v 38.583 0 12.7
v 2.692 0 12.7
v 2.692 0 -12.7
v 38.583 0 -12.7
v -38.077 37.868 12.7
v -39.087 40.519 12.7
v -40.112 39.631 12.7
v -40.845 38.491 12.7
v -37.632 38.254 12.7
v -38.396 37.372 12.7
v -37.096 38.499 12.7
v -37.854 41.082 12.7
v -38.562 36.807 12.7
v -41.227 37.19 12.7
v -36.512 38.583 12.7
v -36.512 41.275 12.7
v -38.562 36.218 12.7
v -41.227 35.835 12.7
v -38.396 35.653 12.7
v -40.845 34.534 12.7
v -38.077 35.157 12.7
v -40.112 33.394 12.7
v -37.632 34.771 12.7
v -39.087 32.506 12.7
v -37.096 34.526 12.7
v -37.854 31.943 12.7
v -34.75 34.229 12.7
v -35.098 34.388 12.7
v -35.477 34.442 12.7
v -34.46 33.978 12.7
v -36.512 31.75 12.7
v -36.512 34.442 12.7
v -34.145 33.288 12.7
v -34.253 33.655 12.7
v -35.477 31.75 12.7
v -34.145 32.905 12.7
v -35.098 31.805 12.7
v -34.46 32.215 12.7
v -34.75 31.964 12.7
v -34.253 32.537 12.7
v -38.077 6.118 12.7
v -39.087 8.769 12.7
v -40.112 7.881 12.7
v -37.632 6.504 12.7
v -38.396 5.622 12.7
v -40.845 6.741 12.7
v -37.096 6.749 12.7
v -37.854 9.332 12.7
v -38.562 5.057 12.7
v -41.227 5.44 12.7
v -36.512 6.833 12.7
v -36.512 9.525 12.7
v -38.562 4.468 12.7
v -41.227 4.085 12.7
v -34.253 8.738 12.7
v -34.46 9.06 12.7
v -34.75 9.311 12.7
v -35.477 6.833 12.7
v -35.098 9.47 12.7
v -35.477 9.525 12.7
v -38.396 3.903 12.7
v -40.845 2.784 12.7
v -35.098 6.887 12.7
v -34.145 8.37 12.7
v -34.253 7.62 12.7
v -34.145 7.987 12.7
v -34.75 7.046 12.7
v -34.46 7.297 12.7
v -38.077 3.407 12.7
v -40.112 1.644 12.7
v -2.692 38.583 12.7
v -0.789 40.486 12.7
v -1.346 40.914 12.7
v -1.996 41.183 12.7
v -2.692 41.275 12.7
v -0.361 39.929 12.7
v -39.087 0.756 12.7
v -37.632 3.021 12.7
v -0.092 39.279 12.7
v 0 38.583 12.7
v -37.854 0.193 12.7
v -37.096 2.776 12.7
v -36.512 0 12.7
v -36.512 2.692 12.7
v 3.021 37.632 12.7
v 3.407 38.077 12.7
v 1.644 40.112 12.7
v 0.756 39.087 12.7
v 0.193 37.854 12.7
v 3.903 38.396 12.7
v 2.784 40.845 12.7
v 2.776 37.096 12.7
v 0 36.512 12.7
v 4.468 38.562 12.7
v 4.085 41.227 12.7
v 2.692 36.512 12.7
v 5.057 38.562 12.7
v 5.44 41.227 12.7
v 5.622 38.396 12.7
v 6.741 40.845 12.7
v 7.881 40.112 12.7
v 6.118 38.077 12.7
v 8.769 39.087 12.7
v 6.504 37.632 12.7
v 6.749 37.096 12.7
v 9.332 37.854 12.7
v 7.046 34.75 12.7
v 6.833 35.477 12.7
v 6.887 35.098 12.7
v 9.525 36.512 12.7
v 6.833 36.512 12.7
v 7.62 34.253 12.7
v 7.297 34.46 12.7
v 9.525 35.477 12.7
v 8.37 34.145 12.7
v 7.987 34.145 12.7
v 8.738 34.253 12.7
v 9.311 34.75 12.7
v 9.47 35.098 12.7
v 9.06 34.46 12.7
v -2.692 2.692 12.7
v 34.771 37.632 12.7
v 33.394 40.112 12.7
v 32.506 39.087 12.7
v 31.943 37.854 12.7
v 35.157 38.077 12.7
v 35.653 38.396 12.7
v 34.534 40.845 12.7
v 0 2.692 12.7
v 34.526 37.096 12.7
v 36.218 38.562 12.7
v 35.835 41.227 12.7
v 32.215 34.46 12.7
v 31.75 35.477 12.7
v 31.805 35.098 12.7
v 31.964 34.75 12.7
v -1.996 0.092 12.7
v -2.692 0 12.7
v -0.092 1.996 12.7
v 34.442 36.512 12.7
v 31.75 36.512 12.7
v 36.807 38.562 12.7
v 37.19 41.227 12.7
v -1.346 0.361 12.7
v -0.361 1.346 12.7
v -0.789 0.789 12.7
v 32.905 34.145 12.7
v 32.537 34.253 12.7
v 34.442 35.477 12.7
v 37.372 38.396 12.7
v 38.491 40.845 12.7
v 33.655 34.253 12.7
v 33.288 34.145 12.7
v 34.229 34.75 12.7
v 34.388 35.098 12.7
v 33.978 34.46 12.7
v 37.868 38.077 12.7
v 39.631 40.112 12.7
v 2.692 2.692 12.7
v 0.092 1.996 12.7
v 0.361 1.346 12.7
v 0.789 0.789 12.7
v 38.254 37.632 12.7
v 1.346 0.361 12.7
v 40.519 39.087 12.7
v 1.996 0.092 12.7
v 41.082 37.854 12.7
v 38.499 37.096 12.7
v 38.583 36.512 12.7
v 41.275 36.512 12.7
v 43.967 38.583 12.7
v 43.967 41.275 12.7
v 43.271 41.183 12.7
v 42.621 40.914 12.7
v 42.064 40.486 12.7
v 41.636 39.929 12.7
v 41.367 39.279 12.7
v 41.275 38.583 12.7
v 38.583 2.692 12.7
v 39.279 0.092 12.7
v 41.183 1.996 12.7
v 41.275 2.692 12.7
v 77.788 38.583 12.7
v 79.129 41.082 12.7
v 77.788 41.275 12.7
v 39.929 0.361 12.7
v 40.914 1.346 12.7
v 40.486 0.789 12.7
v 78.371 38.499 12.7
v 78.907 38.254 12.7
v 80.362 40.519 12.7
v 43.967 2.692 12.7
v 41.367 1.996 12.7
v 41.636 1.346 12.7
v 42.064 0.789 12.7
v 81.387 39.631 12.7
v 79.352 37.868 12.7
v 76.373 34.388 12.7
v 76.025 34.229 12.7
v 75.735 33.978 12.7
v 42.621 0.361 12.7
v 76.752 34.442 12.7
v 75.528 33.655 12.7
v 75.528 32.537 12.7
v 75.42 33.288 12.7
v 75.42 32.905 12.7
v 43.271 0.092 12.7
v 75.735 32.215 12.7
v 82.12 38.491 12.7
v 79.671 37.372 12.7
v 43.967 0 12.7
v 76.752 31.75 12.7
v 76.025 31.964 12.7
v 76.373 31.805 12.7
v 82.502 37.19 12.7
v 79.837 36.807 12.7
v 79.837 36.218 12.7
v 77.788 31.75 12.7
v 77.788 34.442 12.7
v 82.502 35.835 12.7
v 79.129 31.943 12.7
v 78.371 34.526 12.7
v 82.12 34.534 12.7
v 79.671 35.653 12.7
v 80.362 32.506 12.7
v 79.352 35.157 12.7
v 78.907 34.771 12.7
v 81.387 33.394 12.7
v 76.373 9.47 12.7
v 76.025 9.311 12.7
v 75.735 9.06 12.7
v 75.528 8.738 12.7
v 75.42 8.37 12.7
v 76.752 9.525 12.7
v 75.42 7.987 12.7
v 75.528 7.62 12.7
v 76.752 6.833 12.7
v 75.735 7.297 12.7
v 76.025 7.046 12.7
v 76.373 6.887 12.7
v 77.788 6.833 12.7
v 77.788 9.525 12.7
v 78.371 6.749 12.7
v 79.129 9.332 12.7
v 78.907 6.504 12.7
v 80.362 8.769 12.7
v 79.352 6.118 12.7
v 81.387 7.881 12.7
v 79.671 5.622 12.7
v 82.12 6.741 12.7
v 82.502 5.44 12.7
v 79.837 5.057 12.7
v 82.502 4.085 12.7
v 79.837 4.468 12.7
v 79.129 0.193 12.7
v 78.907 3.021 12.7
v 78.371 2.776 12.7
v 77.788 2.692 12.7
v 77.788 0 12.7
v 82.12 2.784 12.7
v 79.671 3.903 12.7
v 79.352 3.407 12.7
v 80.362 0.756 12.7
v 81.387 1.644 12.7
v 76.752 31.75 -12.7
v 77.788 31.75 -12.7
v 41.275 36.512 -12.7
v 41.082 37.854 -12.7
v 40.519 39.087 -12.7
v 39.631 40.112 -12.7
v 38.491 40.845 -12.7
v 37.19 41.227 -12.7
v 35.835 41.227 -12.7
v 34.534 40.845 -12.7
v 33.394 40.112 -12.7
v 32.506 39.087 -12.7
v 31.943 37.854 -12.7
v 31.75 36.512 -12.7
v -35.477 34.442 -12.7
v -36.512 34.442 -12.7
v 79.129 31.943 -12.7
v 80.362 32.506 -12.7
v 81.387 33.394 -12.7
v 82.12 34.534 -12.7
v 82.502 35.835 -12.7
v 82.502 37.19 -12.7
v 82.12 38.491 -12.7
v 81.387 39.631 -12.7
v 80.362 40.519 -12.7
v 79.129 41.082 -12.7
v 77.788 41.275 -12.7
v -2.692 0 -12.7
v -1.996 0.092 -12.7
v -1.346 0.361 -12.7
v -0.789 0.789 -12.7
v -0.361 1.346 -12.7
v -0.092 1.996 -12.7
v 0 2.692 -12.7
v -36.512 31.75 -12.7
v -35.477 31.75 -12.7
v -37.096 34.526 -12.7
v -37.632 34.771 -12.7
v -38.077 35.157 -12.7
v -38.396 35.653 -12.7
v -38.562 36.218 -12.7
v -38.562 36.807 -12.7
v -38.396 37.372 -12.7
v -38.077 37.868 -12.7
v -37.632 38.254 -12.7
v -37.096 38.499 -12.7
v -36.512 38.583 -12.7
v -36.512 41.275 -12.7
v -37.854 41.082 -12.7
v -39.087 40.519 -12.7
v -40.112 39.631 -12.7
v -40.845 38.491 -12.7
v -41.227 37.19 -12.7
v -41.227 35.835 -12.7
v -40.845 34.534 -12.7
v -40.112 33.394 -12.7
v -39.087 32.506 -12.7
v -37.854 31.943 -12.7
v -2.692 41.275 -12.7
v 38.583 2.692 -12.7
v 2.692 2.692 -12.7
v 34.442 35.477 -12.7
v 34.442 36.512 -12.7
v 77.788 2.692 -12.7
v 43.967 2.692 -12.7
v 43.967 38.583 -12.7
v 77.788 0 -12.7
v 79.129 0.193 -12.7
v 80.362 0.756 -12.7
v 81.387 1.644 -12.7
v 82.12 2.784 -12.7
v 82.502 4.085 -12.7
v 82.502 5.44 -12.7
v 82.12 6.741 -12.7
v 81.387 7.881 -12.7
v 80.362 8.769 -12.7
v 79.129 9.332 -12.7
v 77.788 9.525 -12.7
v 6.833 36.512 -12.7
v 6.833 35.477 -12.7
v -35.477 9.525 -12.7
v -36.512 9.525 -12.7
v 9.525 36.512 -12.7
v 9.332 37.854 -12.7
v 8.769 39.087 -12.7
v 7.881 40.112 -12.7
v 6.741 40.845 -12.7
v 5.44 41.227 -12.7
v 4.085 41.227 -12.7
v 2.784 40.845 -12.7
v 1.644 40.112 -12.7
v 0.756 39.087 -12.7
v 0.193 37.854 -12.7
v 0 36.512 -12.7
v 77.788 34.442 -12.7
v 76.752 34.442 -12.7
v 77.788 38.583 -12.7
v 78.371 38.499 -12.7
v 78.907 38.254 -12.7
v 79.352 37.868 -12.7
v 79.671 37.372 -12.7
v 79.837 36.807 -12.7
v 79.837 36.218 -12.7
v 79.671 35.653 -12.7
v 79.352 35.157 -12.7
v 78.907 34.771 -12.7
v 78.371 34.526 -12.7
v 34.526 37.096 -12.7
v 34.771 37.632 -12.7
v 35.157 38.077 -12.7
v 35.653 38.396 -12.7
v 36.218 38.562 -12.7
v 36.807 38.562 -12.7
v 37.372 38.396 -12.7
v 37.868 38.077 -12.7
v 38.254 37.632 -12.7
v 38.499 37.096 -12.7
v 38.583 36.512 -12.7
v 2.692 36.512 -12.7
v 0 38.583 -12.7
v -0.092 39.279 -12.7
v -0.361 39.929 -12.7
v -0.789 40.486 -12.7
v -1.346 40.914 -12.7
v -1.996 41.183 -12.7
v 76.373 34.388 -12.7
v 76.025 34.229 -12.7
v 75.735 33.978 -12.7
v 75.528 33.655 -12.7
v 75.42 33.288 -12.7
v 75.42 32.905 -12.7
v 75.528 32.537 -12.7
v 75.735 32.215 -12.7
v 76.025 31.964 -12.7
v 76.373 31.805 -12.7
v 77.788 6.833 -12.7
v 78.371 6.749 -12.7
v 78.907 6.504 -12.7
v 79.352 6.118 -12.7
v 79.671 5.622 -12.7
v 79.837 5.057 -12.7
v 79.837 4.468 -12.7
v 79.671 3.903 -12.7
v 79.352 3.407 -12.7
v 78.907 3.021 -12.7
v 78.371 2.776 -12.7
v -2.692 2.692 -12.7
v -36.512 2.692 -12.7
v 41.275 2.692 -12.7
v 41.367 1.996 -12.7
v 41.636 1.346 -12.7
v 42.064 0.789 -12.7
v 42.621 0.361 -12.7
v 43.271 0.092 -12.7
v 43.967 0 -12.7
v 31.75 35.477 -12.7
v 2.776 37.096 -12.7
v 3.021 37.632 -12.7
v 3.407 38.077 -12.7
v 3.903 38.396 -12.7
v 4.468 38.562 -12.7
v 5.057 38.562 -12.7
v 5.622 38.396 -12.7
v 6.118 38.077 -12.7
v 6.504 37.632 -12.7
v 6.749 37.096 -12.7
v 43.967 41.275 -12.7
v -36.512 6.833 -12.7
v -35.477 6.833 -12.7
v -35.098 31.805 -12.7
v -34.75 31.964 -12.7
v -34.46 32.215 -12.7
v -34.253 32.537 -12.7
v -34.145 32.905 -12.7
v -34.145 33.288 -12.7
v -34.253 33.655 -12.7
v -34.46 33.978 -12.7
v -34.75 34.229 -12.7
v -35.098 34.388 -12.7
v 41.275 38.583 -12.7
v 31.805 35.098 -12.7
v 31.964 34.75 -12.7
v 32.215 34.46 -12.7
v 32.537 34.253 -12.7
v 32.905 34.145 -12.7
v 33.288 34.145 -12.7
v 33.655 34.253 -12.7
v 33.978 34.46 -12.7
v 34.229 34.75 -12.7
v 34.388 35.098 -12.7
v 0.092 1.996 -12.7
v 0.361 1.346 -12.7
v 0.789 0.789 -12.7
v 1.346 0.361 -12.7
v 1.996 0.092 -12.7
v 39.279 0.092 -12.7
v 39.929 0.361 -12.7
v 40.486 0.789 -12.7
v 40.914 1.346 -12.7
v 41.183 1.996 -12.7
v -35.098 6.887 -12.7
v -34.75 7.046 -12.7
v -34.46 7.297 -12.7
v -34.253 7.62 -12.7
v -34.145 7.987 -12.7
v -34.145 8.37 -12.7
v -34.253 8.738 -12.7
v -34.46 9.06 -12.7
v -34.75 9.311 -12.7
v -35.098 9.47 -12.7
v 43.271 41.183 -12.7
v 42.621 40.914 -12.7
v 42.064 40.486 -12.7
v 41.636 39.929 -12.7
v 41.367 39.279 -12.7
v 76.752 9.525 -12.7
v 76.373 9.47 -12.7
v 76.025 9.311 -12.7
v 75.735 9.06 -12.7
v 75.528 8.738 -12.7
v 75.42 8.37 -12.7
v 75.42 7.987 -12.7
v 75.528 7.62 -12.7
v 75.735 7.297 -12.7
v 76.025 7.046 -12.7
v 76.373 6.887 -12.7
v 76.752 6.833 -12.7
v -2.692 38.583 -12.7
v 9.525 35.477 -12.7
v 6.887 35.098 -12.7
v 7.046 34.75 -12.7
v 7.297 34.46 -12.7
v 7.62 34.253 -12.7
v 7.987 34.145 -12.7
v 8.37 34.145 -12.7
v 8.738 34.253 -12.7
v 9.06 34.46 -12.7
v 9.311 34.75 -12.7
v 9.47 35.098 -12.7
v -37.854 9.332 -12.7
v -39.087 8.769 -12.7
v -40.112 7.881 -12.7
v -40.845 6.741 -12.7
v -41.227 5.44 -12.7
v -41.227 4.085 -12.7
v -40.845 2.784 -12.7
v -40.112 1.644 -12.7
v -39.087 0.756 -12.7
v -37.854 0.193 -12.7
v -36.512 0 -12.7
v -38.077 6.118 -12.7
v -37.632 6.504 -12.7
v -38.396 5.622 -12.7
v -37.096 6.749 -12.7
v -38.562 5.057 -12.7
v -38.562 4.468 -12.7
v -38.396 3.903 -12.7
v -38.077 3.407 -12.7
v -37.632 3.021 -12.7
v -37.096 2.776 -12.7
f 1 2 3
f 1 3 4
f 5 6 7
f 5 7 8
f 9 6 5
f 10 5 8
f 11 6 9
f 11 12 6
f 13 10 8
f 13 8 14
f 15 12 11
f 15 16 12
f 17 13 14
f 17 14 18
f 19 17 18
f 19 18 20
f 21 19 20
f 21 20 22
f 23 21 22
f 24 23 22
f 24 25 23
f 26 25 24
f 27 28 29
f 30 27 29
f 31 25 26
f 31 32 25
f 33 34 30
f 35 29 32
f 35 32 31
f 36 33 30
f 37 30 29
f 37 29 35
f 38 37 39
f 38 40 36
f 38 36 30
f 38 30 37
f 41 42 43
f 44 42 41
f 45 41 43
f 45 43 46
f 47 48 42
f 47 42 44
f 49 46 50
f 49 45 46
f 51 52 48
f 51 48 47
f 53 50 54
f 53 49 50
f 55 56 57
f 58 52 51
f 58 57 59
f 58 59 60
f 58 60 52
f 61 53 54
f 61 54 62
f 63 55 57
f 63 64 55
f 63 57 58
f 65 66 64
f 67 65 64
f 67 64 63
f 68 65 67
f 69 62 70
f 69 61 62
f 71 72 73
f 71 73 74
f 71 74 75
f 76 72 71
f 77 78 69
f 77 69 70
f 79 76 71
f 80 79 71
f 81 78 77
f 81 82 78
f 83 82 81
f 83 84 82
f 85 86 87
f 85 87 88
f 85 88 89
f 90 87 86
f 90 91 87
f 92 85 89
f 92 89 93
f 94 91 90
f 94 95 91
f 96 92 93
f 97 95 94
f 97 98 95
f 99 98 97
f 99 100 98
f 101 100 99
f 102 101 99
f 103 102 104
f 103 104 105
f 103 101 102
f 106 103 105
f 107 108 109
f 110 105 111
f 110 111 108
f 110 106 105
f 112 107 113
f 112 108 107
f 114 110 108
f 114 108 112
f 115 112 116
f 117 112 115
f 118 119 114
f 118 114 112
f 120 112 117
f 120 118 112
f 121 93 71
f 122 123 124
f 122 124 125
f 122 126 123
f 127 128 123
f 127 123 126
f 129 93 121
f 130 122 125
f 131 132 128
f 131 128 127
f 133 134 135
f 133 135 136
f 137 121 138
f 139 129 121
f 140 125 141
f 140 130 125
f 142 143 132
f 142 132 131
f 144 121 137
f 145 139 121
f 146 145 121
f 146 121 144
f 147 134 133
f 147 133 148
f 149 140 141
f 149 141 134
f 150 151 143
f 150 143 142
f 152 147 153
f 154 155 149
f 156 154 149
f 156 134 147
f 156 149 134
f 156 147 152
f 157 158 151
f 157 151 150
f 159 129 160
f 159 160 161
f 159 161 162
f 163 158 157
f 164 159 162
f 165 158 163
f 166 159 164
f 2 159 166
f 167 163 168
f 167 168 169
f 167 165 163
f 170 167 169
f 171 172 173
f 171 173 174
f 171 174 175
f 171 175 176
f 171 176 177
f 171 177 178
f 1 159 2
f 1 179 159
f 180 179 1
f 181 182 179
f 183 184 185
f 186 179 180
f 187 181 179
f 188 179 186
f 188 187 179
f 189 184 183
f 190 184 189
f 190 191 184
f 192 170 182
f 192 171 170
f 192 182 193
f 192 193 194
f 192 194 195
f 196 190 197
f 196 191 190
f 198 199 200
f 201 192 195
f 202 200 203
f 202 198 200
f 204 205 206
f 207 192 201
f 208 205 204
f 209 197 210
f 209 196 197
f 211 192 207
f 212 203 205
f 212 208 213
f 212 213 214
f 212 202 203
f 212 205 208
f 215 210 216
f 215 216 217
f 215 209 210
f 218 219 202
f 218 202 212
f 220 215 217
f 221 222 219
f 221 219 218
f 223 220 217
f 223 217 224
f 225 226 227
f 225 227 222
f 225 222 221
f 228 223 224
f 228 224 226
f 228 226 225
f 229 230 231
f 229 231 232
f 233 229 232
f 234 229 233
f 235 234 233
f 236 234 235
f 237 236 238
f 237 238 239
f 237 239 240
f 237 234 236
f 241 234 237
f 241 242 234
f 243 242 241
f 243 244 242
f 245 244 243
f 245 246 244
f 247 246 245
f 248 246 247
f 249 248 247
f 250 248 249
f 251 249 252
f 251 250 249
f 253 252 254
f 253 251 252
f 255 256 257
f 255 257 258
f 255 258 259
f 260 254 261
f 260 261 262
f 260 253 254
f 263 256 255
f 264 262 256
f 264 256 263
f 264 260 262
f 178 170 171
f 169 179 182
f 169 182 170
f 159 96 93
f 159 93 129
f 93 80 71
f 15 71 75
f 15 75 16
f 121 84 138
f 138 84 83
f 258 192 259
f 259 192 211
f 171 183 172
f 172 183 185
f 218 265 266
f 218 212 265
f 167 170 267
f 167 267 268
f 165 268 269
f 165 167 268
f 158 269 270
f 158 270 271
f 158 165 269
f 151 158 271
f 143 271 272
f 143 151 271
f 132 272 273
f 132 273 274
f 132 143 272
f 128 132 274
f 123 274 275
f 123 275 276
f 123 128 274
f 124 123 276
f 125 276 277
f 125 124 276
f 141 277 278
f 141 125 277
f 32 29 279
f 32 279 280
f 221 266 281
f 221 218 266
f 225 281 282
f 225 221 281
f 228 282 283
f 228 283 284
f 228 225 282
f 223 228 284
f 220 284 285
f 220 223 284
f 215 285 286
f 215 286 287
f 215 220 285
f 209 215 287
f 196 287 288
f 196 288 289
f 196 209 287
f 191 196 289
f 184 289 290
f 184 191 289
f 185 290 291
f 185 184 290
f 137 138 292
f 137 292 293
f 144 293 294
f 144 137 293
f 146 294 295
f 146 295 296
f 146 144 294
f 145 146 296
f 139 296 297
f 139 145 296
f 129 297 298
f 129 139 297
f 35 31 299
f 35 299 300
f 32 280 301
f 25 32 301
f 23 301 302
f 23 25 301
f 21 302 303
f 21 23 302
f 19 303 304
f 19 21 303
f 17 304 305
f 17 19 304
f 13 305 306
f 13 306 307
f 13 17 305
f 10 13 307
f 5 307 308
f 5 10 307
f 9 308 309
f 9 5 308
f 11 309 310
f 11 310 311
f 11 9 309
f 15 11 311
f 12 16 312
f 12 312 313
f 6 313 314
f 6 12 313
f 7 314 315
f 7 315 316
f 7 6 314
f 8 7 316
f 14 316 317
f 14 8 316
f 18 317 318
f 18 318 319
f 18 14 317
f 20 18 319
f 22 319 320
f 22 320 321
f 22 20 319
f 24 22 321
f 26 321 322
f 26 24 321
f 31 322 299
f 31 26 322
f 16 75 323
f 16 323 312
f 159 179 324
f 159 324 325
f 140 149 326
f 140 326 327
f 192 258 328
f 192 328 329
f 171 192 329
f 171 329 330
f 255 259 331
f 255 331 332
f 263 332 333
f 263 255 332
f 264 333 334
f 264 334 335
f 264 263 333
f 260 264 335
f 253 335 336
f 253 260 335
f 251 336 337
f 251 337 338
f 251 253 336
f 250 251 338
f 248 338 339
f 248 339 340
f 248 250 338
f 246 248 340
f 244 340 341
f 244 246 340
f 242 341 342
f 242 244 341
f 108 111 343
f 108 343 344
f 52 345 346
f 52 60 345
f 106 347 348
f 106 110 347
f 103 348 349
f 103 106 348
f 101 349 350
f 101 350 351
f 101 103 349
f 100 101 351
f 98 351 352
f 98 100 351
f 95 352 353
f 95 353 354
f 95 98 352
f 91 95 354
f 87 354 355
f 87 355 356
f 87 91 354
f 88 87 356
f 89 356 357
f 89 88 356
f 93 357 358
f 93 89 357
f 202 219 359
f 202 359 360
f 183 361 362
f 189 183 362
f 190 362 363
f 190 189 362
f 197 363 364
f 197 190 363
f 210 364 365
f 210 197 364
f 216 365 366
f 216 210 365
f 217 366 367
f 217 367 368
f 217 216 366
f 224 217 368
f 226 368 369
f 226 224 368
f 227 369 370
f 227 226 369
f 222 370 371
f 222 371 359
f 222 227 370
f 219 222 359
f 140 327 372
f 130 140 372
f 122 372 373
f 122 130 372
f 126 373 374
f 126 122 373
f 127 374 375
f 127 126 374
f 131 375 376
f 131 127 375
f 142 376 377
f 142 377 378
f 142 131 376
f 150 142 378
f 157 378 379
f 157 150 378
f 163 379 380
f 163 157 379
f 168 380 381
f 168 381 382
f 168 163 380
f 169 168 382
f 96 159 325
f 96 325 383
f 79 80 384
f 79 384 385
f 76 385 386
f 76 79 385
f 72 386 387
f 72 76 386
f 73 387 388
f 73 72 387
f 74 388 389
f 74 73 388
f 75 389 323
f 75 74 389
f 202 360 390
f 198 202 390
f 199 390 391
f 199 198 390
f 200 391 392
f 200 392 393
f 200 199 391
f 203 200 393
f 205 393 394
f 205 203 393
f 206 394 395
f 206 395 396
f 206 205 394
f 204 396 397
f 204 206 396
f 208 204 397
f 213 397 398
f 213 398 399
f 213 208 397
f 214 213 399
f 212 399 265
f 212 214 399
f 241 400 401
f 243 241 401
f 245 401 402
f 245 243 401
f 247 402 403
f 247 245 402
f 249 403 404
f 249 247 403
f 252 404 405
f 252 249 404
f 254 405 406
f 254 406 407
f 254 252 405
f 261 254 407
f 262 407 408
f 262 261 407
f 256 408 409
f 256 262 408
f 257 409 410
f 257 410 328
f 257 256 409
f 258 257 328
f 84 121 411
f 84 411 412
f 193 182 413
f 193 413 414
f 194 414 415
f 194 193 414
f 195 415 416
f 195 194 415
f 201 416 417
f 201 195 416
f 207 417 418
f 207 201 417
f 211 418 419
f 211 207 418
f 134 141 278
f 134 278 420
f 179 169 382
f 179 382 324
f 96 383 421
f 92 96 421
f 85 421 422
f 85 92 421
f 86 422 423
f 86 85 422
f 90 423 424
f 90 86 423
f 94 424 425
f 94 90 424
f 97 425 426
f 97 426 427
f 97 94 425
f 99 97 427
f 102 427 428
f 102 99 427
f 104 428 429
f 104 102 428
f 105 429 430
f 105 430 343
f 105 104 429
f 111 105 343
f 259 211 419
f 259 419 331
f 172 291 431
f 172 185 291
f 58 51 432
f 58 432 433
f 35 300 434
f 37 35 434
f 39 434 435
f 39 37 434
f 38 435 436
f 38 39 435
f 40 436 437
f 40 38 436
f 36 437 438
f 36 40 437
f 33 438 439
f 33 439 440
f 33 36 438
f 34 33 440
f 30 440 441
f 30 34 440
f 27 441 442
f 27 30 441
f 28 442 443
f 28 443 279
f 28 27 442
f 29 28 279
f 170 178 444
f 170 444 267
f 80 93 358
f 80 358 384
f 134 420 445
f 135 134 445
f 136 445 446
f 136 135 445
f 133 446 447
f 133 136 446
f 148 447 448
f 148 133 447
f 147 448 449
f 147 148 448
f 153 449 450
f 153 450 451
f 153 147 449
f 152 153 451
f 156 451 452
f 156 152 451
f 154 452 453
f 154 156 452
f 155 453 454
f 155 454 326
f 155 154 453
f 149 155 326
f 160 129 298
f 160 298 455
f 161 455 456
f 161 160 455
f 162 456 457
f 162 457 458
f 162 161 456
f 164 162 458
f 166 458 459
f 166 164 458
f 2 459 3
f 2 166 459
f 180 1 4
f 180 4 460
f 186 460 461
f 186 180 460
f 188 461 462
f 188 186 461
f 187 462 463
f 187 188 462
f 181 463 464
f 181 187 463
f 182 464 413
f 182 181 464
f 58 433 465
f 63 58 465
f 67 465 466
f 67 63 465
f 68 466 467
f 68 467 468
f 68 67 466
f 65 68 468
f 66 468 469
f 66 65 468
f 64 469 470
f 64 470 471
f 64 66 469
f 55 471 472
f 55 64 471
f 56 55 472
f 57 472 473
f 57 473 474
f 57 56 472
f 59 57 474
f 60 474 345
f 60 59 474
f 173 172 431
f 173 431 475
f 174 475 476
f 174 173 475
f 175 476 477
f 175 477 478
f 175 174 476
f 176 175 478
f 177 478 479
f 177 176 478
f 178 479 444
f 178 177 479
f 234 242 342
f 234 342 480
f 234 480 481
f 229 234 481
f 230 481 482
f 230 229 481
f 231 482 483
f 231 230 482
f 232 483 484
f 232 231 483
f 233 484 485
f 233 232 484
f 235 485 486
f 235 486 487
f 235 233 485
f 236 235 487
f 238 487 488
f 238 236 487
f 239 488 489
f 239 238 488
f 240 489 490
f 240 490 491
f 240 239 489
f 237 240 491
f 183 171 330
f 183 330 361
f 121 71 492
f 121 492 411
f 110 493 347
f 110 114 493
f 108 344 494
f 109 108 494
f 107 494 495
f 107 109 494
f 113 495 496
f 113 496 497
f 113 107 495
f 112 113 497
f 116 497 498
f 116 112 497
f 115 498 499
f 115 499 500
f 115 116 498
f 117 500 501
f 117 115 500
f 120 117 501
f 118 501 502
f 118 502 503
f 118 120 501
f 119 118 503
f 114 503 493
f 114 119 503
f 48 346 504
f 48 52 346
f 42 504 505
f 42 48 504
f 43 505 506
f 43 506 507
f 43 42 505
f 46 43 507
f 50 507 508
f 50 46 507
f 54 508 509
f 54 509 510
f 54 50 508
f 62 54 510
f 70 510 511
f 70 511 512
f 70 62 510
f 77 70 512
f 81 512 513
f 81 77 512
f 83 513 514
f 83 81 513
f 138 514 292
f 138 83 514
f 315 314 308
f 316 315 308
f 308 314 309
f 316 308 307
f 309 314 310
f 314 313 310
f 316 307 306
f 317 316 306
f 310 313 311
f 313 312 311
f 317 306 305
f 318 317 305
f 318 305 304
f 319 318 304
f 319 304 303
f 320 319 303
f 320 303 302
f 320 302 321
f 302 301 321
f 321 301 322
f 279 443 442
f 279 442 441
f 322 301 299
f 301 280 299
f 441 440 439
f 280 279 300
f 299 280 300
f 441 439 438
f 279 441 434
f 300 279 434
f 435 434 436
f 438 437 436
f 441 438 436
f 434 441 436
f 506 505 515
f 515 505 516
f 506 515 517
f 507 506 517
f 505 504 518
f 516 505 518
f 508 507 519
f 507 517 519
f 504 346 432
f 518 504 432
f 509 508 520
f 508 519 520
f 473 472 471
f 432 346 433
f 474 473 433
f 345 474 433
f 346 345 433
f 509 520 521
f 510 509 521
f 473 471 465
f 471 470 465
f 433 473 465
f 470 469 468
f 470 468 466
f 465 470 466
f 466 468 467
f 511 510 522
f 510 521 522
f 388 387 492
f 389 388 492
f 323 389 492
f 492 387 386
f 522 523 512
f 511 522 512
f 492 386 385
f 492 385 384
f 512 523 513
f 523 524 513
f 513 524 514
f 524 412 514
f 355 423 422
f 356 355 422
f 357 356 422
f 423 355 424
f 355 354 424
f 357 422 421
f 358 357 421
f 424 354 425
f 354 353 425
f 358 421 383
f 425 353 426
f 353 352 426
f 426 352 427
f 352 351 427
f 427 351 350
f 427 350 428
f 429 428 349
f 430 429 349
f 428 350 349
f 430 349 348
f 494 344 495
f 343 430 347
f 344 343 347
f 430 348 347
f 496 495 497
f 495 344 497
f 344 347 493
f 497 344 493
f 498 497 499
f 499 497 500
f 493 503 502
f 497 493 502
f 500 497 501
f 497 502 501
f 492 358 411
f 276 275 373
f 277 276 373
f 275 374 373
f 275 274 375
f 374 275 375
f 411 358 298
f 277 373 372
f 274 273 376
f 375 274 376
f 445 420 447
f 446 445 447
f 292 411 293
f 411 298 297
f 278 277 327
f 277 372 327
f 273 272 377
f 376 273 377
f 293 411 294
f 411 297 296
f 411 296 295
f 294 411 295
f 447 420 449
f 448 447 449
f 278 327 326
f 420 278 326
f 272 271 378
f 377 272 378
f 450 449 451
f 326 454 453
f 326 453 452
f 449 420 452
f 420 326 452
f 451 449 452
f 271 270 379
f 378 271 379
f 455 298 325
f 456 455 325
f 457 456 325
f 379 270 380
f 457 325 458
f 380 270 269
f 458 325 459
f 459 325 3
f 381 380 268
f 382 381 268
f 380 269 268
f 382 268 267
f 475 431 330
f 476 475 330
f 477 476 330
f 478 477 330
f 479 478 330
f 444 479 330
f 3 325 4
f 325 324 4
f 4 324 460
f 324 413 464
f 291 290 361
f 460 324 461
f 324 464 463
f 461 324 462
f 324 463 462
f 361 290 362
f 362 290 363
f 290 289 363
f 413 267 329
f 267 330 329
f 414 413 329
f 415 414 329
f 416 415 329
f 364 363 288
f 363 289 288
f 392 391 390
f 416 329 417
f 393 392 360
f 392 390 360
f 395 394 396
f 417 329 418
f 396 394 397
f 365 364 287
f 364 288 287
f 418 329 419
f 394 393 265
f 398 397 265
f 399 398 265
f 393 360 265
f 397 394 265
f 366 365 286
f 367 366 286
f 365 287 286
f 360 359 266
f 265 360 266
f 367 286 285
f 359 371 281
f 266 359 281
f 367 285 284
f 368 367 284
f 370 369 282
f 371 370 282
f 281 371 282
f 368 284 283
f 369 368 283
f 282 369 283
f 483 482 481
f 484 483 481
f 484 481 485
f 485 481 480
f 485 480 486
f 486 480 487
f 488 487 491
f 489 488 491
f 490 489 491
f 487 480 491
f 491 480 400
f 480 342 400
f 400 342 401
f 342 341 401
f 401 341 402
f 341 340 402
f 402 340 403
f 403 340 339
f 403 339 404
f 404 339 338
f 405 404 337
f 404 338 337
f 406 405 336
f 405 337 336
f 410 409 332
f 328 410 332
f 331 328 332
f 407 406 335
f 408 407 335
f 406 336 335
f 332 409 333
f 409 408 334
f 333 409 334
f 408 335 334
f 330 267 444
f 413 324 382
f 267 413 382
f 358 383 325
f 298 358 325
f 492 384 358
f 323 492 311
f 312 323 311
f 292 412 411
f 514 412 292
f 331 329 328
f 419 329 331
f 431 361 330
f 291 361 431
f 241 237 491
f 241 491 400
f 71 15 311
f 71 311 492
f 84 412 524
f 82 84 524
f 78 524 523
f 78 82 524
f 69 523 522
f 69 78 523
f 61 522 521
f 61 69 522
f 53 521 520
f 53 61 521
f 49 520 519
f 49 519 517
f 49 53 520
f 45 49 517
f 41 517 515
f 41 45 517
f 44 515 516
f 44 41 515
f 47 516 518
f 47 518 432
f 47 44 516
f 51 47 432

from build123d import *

# Parameters (mm, degrees)
BASE_EXTRUDE_DEPTH = 12.7
CIRPATTERN1_COUNT  = 2
CIRPATTERN1_ANGLE  = 90
CIRPATTERN2_COUNT  = 2
CIRPATTERN2_ANGLE  = 90


with BuildPart() as part:
    # Sketch1 → Base-Extrude (new, symmetric)
    with BuildSketch(Plane.XY):
        with BuildLine():
            Line((0, 36.5125), (0, 2.6924))
            ThreePointArc((0, 2.6924), (0.788585702, 0.788585702), (2.6924, 0))
            Line((2.6924, 0), (38.5826, 0))
            ThreePointArc((38.5826, 0), (40.486414298, 0.788585702), (41.275, 2.6924))
            Line((41.275, 2.6924), (41.275, 36.5125))
            ThreePointArc((41.275, 36.5125), (36.5125, 41.275), (31.75, 36.5125))
            Line((31.75, 36.5125), (31.75, 35.47745))
            ThreePointArc((31.75, 35.47745), (33.0962, 34.13125), (34.4424, 35.47745))
            Line((34.4424, 35.47745), (34.4424, 36.5125))
            ThreePointArc((34.4424, 36.5125), (36.5125, 38.5826), (38.5826, 36.5125))
            Line((38.5826, 36.5125), (38.5826, 2.6924))
            Line((38.5826, 2.6924), (2.6924, 2.6924))
            Line((2.6924, 2.6924), (2.6924, 36.5125))
            ThreePointArc((2.6924, 36.5125), (4.7625, 38.5826), (6.8326, 36.5125))
            Line((6.8326, 36.5125), (6.8326, 35.47745))
            ThreePointArc((6.8326, 35.47745), (8.1788, 34.13125), (9.525, 35.47745))
            Line((9.525, 35.47745), (9.525, 36.5125))
            ThreePointArc((9.525, 36.5125), (4.7625, 41.275), (0, 36.5125))
        make_face()
    base_extrude = extrude(amount=BASE_EXTRUDE_DEPTH, both=True)

    # CirPattern1: Base-Extrude ×2 about axis
    cirpattern1_axis = Axis((0, 0, 0), (0, 0, 1))
    for i in range(1, CIRPATTERN1_COUNT):
        add(base_extrude.rotate(cirpattern1_axis, i * CIRPATTERN1_ANGLE / (CIRPATTERN1_COUNT - 1)))

    # CirPattern2: Base-Extrude ×2 about axis
    cirpattern2_axis = Axis((41.275, 0, 0), (0, 0, -1))
    for i in range(1, CIRPATTERN2_COUNT):
        add(base_extrude.rotate(cirpattern2_axis, i * CIRPATTERN2_ANGLE / (CIRPATTERN2_COUNT - 1)))


solid = part.part
